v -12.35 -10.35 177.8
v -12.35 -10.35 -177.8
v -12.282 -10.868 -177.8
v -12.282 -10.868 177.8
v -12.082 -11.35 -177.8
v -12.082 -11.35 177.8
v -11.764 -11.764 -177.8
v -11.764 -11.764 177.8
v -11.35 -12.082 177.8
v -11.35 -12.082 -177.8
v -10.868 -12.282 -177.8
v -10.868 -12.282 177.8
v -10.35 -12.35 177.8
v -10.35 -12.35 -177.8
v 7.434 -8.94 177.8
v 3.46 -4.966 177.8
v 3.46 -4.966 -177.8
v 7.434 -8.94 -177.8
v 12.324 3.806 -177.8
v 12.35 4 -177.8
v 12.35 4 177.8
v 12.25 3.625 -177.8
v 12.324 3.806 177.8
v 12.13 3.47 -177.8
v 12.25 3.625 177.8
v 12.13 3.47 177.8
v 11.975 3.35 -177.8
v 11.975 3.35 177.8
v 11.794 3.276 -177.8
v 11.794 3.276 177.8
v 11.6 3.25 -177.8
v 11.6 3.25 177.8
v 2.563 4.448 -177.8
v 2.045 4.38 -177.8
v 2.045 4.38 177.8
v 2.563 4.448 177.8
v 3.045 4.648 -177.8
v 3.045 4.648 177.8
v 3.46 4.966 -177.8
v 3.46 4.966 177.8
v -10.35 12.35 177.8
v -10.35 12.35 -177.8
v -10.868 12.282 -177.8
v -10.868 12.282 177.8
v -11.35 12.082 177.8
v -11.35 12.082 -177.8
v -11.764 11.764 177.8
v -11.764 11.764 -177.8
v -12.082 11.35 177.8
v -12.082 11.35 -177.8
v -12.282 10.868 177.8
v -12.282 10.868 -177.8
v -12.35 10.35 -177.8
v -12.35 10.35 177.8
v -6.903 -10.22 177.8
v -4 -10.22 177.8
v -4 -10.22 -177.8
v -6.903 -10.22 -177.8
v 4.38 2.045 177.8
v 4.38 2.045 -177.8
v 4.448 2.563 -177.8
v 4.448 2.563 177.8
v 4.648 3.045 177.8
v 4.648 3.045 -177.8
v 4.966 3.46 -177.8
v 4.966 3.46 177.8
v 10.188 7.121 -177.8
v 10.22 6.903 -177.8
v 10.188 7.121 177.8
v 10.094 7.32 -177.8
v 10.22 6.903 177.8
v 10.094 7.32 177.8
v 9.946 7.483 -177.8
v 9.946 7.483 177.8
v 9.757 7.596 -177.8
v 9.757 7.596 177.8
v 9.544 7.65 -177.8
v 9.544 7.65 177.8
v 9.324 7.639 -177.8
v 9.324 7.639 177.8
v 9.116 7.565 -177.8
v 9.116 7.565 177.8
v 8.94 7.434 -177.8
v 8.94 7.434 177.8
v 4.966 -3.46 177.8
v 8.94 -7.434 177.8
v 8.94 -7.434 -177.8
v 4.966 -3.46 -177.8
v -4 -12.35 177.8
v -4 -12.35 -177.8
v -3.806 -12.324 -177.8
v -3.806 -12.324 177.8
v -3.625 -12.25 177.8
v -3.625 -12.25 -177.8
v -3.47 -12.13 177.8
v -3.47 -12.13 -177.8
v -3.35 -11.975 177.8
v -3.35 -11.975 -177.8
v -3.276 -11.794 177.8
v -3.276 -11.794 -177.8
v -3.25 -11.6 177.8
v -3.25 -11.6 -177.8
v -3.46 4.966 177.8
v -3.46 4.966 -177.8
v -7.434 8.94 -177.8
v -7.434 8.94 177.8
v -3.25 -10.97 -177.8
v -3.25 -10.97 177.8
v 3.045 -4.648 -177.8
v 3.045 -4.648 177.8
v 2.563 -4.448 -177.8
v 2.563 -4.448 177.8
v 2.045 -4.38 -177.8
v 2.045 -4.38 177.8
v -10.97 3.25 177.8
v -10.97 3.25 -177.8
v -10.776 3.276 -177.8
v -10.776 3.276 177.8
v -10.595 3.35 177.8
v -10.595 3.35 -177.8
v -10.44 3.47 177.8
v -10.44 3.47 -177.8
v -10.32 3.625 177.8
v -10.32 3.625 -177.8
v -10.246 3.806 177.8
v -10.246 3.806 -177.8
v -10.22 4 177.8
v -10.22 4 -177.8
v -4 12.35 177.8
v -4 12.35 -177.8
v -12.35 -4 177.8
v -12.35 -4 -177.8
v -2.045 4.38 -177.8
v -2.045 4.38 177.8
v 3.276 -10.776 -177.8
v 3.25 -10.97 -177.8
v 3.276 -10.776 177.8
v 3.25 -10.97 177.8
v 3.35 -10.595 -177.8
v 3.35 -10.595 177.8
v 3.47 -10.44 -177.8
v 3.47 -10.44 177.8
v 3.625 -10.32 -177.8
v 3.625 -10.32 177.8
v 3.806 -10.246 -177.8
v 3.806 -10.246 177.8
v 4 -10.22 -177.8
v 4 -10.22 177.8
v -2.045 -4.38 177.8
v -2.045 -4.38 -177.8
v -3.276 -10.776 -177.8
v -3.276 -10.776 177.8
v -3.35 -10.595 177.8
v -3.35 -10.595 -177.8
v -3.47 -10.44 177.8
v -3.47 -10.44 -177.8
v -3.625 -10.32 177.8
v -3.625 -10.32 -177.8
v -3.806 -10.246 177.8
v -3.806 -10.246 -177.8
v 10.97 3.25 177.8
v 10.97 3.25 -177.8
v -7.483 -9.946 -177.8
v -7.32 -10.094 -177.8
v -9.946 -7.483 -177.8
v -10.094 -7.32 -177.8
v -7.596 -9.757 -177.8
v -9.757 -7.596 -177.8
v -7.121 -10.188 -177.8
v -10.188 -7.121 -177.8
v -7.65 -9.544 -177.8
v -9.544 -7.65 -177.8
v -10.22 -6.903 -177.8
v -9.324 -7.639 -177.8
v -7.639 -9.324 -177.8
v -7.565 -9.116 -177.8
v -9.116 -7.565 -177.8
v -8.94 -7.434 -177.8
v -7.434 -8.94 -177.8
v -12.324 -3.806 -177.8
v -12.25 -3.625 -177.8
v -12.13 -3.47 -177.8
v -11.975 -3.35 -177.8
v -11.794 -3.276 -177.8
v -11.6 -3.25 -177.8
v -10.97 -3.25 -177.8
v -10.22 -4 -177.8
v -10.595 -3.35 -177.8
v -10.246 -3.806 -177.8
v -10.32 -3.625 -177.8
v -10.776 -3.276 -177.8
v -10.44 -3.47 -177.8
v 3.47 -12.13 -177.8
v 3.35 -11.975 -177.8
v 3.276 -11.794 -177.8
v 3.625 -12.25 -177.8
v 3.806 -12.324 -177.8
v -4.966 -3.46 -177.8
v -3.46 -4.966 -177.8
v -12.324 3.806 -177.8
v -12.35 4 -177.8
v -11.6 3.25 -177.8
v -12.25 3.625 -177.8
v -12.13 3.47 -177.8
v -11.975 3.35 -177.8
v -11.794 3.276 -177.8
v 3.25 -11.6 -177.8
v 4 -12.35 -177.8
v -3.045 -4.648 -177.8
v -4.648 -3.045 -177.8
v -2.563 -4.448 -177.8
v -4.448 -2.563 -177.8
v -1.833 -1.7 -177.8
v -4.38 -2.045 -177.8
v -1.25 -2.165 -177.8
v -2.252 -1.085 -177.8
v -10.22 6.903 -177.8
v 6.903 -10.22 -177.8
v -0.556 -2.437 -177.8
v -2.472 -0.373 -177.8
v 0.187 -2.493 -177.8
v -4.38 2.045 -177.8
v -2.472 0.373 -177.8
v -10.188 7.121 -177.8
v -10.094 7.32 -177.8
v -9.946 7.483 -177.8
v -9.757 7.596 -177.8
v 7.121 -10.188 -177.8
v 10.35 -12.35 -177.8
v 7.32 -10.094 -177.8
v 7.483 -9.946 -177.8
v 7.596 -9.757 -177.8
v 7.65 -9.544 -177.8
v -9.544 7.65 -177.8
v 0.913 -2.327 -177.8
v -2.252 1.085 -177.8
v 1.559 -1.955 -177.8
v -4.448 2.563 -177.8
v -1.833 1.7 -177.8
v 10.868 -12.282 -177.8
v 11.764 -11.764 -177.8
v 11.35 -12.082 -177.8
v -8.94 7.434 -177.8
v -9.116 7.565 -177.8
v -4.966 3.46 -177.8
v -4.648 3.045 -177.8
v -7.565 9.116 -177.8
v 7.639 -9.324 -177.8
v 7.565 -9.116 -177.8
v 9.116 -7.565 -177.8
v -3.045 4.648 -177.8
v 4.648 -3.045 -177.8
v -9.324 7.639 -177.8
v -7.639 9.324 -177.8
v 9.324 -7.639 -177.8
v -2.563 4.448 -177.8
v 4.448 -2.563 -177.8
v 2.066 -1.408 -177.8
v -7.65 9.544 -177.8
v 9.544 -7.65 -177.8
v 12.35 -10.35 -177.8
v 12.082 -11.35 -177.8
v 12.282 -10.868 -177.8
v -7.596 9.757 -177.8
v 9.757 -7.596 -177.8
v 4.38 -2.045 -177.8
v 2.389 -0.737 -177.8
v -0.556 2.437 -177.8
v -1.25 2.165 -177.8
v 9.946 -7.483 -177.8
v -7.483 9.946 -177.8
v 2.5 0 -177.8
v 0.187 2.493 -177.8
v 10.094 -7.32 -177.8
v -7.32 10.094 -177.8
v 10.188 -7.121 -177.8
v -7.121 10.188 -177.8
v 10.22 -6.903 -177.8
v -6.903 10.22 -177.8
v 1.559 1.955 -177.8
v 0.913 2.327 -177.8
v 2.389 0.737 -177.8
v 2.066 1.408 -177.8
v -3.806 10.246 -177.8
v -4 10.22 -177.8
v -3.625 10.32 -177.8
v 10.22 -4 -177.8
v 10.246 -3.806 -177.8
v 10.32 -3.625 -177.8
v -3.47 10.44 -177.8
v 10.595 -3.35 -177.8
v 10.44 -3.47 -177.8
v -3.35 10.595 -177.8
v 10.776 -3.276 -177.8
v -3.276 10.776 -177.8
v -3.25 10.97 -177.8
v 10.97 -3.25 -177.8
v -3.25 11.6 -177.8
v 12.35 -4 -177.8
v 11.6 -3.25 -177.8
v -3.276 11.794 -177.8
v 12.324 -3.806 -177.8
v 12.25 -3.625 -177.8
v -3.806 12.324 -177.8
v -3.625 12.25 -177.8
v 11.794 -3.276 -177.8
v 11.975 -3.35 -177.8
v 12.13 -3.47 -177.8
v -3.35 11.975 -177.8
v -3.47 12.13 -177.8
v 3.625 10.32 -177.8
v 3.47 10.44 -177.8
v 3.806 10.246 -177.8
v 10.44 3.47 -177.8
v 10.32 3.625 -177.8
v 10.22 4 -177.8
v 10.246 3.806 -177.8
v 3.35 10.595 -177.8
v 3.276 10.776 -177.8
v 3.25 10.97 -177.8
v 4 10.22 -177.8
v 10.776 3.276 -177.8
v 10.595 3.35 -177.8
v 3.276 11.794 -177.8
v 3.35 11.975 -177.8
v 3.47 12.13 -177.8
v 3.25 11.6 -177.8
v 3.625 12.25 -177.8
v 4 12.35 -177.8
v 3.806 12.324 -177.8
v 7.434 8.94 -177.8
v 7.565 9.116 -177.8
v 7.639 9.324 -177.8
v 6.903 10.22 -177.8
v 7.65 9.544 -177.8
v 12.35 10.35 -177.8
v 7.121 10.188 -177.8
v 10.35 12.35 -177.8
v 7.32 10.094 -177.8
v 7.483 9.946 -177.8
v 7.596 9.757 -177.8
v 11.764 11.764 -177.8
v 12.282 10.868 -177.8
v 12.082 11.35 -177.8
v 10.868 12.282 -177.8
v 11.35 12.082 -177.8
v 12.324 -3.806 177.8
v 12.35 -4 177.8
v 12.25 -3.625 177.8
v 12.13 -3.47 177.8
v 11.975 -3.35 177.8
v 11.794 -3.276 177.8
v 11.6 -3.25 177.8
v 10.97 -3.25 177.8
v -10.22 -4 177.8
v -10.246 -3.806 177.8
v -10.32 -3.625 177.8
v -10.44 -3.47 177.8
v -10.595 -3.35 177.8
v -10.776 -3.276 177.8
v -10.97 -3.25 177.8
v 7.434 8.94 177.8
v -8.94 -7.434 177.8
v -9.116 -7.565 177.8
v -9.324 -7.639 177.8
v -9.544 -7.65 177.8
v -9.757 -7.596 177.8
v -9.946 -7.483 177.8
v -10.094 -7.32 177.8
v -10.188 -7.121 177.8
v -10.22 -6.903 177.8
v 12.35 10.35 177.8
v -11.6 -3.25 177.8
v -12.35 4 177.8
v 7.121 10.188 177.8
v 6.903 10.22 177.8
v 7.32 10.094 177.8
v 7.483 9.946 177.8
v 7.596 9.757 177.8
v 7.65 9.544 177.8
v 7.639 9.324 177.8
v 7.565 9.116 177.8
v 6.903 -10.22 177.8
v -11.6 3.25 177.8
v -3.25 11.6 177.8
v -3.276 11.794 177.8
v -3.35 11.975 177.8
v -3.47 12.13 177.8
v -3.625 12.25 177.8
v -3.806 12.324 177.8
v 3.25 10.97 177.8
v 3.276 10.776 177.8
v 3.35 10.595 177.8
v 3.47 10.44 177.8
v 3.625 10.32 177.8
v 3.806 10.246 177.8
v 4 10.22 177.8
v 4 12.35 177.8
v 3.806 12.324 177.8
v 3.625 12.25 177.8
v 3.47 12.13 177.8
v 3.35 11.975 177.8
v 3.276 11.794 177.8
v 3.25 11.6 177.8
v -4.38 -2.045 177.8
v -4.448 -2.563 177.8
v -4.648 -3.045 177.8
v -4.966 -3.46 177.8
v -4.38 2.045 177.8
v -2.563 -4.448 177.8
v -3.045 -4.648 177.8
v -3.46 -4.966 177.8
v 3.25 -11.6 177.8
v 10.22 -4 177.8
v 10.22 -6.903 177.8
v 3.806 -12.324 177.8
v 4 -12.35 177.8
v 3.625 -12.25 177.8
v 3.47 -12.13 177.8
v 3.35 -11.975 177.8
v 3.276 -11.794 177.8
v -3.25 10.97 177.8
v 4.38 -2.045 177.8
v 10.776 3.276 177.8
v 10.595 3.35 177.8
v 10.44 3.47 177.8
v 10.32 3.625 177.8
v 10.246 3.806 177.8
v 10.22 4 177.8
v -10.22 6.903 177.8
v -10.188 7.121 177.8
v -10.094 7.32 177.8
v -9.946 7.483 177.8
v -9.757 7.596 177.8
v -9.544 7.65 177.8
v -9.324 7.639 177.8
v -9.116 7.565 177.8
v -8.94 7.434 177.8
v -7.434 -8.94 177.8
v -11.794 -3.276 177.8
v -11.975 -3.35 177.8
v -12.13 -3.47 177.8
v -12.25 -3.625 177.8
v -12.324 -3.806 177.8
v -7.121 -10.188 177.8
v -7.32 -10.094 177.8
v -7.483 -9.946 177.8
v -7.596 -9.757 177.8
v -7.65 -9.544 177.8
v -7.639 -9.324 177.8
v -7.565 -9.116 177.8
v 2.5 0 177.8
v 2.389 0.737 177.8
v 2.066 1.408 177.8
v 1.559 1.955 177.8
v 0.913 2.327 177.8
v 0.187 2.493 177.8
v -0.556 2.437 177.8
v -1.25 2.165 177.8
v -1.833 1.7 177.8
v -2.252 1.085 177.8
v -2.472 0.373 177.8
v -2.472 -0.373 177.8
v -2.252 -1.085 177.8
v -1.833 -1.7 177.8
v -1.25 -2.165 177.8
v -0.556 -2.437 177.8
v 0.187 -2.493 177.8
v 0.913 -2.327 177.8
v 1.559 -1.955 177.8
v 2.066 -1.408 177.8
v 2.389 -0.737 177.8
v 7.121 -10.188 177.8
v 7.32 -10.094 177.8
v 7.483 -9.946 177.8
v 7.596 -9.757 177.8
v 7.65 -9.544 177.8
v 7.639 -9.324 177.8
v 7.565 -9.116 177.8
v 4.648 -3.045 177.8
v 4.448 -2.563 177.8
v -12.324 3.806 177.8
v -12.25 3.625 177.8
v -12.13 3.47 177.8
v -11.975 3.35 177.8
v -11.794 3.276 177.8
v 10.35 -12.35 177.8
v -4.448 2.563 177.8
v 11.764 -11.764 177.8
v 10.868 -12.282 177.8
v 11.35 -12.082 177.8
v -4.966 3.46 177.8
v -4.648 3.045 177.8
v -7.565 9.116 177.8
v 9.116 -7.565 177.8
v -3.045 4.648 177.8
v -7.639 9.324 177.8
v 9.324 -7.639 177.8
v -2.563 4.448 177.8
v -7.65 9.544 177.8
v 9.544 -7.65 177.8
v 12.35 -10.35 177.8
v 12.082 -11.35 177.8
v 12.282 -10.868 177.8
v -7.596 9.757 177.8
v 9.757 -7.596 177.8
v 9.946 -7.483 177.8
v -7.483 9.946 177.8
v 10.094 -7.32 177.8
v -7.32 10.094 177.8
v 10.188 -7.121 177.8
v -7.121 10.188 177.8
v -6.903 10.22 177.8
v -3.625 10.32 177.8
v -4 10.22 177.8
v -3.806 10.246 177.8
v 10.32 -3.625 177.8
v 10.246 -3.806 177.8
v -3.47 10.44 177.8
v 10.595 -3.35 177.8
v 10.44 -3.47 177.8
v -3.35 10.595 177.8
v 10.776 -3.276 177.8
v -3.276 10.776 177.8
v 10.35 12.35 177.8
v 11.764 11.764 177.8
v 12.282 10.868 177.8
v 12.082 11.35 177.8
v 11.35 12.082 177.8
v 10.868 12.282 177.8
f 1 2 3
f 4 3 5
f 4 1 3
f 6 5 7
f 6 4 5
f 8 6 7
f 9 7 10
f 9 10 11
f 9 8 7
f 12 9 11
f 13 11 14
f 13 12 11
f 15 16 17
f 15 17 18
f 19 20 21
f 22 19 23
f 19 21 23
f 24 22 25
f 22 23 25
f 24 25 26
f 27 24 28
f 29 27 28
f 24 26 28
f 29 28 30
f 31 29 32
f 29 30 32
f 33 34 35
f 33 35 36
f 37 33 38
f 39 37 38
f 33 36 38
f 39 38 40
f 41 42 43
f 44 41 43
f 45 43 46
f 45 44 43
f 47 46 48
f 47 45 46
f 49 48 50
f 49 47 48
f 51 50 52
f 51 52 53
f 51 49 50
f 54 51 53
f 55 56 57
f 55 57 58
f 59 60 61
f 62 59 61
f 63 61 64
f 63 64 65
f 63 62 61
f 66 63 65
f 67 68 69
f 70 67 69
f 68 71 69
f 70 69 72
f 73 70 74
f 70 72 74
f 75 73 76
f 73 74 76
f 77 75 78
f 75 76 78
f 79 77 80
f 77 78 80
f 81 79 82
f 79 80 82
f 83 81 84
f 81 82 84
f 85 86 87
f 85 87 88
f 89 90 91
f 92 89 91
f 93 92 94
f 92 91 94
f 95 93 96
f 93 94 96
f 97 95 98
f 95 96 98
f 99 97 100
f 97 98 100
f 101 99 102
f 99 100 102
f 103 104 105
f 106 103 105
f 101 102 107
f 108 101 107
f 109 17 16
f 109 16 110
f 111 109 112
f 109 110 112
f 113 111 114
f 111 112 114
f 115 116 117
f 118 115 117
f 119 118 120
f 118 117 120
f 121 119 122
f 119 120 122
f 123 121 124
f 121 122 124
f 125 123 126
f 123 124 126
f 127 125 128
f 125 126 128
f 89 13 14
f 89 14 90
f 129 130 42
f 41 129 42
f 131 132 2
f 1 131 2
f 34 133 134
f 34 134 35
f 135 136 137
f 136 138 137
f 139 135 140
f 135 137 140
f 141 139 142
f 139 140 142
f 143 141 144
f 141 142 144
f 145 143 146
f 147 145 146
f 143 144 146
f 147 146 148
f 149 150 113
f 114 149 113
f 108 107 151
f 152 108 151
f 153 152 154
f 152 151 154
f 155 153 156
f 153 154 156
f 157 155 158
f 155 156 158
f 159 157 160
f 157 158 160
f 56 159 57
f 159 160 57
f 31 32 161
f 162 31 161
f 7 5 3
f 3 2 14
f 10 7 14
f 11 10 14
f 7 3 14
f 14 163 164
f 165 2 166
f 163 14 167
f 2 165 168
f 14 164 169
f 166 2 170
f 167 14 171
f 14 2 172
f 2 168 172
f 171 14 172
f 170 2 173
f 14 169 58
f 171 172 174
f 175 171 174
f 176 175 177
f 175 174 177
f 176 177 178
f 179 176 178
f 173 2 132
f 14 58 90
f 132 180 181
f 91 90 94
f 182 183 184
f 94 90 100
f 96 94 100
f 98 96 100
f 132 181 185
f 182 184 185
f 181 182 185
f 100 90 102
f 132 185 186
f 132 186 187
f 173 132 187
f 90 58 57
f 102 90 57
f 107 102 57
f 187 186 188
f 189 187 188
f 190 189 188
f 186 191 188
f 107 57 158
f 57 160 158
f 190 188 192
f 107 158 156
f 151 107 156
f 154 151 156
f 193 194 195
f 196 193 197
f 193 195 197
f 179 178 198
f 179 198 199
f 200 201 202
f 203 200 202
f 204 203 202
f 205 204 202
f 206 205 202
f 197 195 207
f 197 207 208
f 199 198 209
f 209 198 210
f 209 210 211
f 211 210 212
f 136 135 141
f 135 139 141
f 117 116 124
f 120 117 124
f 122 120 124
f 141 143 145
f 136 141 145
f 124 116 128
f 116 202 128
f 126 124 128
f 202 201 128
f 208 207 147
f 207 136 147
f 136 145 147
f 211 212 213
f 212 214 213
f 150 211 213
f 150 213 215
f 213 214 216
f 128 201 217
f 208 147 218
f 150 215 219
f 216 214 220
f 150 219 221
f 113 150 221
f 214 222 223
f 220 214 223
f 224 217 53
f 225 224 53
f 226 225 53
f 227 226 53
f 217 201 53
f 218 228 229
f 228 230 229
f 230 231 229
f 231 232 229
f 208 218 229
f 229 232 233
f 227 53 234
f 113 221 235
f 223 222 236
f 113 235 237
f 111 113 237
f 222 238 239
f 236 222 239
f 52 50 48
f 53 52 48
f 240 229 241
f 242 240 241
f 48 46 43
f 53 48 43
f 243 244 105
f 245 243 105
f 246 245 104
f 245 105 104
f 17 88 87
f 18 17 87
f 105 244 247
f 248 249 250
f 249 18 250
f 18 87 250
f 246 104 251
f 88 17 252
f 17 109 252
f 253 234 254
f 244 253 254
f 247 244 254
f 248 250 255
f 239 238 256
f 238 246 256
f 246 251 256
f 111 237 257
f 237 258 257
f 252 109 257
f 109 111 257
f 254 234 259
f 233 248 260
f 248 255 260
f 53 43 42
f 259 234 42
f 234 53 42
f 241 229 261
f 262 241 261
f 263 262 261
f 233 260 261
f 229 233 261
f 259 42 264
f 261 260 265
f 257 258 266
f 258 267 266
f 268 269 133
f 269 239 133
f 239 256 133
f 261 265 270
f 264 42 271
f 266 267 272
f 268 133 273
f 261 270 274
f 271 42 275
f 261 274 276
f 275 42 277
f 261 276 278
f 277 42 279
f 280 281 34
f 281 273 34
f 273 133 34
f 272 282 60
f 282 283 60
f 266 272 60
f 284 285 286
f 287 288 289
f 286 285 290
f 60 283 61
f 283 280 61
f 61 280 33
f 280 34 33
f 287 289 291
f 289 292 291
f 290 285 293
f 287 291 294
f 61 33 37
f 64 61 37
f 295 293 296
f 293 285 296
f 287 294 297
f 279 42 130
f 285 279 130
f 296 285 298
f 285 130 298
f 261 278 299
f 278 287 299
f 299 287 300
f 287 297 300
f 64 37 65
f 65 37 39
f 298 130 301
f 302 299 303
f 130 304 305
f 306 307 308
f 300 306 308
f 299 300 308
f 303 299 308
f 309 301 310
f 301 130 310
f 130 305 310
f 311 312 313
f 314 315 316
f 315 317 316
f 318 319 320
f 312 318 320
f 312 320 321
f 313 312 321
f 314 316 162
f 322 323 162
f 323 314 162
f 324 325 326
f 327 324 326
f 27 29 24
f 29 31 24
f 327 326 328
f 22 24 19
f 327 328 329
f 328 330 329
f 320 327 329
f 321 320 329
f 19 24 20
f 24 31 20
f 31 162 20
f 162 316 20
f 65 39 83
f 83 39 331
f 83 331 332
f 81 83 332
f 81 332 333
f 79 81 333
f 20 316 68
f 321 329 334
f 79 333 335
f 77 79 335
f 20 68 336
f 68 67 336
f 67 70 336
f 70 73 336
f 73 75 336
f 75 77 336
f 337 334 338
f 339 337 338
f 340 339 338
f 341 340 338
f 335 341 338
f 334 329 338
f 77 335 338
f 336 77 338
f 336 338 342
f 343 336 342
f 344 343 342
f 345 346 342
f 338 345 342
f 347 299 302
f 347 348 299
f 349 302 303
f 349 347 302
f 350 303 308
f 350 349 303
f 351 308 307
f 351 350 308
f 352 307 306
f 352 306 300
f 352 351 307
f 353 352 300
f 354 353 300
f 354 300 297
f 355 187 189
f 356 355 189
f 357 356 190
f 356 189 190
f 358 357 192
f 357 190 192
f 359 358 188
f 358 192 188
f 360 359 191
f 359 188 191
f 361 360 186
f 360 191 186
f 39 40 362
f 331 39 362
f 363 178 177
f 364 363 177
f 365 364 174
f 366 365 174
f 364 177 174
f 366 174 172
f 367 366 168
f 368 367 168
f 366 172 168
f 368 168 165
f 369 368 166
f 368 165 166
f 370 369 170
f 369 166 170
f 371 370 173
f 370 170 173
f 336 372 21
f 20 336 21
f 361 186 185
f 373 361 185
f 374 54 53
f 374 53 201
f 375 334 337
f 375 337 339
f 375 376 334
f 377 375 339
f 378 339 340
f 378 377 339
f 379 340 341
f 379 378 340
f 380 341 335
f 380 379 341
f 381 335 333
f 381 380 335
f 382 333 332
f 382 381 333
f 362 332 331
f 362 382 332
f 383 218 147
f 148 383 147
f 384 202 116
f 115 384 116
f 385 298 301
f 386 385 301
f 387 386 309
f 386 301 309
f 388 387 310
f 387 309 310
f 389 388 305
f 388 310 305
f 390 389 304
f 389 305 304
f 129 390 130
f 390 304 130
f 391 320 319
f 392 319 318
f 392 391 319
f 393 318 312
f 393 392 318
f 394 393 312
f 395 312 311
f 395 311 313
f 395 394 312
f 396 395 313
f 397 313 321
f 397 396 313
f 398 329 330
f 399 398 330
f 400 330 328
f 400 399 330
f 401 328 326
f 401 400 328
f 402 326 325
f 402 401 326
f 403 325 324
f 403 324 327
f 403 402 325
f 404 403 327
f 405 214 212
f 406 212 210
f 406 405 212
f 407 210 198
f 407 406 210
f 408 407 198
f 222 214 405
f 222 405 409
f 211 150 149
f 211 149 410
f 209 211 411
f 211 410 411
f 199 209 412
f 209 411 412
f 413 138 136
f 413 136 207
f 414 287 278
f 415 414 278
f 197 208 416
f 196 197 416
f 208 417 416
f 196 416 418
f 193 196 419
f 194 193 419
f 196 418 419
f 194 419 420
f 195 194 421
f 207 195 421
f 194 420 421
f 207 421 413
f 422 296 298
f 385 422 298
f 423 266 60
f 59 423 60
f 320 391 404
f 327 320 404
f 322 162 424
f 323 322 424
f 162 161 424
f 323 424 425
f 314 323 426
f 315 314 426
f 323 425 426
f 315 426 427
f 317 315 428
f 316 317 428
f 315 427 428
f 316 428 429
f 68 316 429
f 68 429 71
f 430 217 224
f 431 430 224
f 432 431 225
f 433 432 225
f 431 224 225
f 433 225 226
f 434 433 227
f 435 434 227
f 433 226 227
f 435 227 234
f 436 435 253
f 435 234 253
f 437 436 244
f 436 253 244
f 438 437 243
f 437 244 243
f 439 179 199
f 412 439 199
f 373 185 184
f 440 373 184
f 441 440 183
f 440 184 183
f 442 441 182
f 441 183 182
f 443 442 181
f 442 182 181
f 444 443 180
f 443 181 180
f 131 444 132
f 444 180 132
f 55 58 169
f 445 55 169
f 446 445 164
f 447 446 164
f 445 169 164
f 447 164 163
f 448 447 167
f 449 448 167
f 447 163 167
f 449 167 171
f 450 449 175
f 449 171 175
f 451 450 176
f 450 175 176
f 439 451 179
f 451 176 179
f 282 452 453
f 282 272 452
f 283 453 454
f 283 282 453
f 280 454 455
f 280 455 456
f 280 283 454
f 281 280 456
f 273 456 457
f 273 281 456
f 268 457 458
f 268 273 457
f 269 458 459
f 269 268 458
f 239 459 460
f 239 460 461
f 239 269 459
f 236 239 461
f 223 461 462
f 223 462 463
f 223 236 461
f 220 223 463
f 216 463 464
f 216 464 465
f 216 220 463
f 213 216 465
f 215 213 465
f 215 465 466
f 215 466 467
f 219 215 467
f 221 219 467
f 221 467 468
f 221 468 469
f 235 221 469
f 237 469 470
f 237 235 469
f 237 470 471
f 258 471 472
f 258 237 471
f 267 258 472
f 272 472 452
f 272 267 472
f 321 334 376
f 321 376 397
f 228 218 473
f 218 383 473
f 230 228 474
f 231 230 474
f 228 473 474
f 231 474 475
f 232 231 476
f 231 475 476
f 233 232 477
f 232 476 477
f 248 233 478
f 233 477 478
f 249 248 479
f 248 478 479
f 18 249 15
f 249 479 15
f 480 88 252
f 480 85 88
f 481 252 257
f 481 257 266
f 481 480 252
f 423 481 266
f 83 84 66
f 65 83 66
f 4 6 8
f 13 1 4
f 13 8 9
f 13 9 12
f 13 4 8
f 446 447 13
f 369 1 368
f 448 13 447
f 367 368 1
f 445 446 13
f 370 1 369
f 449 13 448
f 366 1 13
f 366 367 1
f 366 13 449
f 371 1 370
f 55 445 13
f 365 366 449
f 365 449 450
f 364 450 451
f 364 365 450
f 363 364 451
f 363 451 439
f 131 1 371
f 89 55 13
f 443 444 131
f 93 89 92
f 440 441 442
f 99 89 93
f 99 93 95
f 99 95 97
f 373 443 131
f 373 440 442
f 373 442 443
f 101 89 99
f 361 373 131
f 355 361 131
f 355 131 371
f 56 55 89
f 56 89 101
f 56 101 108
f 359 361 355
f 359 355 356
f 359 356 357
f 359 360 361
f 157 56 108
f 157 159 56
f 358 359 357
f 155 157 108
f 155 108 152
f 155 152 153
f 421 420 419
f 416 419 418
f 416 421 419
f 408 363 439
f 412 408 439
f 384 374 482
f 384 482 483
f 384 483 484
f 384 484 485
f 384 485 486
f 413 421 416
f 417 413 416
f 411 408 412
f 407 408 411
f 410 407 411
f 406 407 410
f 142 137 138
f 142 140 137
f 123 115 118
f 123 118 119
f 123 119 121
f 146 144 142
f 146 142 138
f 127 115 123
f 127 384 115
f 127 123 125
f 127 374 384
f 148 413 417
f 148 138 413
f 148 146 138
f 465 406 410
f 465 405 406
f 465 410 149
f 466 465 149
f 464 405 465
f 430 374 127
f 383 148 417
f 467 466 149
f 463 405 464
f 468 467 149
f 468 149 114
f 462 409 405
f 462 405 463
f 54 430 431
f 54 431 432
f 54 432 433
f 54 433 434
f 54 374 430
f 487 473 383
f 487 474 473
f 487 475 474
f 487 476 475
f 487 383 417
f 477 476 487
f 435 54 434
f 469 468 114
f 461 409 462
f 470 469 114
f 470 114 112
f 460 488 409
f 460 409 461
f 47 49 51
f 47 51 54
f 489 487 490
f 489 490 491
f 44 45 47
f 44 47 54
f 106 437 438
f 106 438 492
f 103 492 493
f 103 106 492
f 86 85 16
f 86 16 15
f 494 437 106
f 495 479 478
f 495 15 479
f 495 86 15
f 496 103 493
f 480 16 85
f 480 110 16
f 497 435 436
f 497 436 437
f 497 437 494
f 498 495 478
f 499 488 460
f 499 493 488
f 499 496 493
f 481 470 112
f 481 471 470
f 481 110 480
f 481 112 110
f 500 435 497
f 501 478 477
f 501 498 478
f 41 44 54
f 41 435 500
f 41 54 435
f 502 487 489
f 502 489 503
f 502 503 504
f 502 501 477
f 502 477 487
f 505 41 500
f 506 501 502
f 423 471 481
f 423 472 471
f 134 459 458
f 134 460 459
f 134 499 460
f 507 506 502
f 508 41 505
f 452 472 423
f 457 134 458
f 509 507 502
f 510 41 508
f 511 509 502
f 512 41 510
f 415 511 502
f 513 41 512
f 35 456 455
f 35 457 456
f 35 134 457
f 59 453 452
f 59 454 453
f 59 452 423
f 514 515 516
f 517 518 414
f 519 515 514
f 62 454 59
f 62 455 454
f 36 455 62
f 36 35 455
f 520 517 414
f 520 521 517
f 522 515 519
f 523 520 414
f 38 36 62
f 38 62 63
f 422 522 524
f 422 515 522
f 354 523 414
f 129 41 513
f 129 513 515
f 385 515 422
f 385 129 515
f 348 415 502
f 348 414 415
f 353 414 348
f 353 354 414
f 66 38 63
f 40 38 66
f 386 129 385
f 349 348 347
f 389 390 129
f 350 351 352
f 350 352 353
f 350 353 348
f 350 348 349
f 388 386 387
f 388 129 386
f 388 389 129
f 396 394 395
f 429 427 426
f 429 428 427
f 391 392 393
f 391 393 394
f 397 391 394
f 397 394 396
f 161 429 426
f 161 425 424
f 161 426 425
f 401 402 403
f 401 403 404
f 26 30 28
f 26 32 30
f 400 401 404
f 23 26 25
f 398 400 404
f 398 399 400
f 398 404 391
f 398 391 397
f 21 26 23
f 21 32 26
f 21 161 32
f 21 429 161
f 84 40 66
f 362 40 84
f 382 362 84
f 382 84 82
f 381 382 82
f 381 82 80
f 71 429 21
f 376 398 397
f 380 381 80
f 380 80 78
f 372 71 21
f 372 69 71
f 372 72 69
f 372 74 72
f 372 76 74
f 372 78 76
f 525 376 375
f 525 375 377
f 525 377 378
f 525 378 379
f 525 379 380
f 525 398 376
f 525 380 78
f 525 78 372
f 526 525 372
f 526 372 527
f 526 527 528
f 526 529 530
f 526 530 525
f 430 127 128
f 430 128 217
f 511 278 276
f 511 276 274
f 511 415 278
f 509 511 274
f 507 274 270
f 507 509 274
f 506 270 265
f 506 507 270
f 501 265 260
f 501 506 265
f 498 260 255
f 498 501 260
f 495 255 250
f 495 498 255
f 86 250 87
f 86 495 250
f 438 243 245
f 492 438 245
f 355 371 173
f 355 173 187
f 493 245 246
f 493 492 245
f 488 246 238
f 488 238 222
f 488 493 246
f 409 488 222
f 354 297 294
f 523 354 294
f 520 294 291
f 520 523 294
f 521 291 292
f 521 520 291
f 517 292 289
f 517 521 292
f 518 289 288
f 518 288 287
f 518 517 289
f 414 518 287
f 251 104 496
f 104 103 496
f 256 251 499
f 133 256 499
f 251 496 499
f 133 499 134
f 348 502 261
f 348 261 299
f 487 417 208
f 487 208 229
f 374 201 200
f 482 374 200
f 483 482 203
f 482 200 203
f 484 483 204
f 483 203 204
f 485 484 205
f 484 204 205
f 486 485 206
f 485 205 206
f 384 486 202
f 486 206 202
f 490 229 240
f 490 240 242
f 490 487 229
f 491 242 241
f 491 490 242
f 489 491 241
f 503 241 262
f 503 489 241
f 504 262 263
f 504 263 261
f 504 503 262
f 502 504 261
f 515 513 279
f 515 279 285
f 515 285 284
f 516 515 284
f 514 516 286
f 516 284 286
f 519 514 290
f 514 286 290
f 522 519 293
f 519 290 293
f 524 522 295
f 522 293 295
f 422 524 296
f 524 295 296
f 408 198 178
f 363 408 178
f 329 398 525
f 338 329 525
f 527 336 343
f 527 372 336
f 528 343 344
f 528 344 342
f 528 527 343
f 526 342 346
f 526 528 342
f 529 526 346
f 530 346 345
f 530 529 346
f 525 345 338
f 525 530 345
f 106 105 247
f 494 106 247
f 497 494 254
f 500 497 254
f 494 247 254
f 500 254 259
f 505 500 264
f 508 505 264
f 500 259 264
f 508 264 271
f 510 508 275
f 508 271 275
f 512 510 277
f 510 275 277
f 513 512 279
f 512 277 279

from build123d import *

# Parameters (mm, degrees)
SKETCH2_W            = 8.76
SKETCH2_H            = 8.76
SKETCH2_R            = 2.5
BOSS_EXTRUDE1_DEPTH  = 177.8
BOSS_EXTRUDE2_START  = -177.8
BOSS_EXTRUDE2_DEPTH  = 355.6
FILLET1_R            = 0.75
FILLET1_OF_MIRROR1_R = 0.75
MIRROR2_START        = -177.8
MIRROR2_DEPTH        = 355.6
FILLET2_R            = 2


# Read off the part's stored shape, not the designer's step: Mirror2
with BuildPart() as part:
    # Sketch2 → Boss-Extrude1 (new, symmetric)
    with BuildSketch(Plane.XY):
        Rectangle(SKETCH2_W, SKETCH2_H)
        Circle(SKETCH2_R, mode=Mode.SUBTRACT)
    extrude(amount=BOSS_EXTRUDE1_DEPTH, both=True)

    # Sketch3 → Boss-Extrude2 (add)
    with BuildSketch(Plane.XY.offset(BOSS_EXTRUDE2_START)):
        Polygon((3.25, 12.35), (12.35, 12.35), (12.35, 3.25), (10.22, 3.25), (10.22, 8.713862556), (4.38, 2.873862556), (4.38, 4.38), (2.873862556, 4.38), (8.713862556, 10.22), (3.25, 10.22), align=None)
    boss_extrude2 = extrude(amount=BOSS_EXTRUDE2_DEPTH)

    # Fillet1
    fillet1_edges = [part.edges().sort_by_distance(p)[0] for p in [
        (3.25, 12.35, 0),
        (3.25, 10.22, 0),
        (8.713862556, 10.22, 0),
        (10.22, 8.713862556, 0),
        (10.22, 3.25, 0),
        (12.35, 3.25, 0),
    ]]
    fillet(fillet1_edges, radius=FILLET1_R)

    # Mirror1: Boss-Extrude2 across plane
    add(boss_extrude2.mirror(Plane.ZX))

    # Fillet1 of Mirror1
    fillet1_of_mirror1_edges = [part.edges().sort_by_distance(p)[0] for p in [
        (3.25, -12.35, 0),
        (3.25, -10.22, 0),
        (8.713862556, -10.22, 0),
        (10.22, -8.713862556, 0),
        (10.22, -3.25, 0),
        (12.35, -3.25, 0),
    ]]
    fillet(fillet1_of_mirror1_edges, radius=FILLET1_OF_MIRROR1_R)

    # Mirror2 outline → Mirror2 (add)
    with BuildSketch(Plane.XY.offset(MIRROR2_START)):
        with BuildLine():
            ThreePointArc((-7.43353247, 8.939669914), (-7.596112034, 9.757012574), (-6.903202384, 10.22))
            Line((-6.903202384, 10.22), (-4, 10.22))
            ThreePointArc((-4, 10.22), (-3.469669914, 10.439669914), (-3.25, 10.97))
            Line((-3.25, 10.97), (-3.25, 11.6))
            ThreePointArc((-3.25, 11.6), (-3.469669914, 12.130330086), (-4, 12.35))
            Line((-4, 12.35), (-12.35, 12.35))
            Line((-12.35, 12.35), (-12.35, 4))
            ThreePointArc((-12.35, 4), (-12.130330086, 3.469669914), (-11.6, 3.25))
            Line((-11.6, 3.25), (-10.97, 3.25))
            ThreePointArc((-10.97, 3.25), (-10.439669914, 3.469669914), (-10.22, 4))
            Line((-10.22, 4), (-10.22, 6.903202384))
            ThreePointArc((-10.22, 6.903202384), (-9.757012574, 7.596112034), (-8.939669914, 7.43353247))
            Line((-8.939669914, 7.43353247), (-4.38, 2.873862556))
            Line((-4.38, 2.873862556), (-4.38, 4.38))
            Line((-4.38, 4.38), (-2.873862556, 4.38))
            Line((-2.873862556, 4.38), (-7.43353247, 8.939669914))
        make_face()
        with BuildLine():
            Line((-4.38, -4.38), (-4.38, -2.873862556))
            Line((-4.38, -2.873862556), (-8.939669914, -7.43353247))
            ThreePointArc((-8.939669914, -7.43353247), (-9.757012574, -7.596112034), (-10.22, -6.903202384))
            Line((-10.22, -6.903202384), (-10.22, -4))
            ThreePointArc((-10.22, -4), (-10.439669914, -3.469669914), (-10.97, -3.25))
            Line((-10.97, -3.25), (-11.6, -3.25))
            ThreePointArc((-11.6, -3.25), (-12.130330086, -3.469669914), (-12.35, -4))
            Line((-12.35, -4), (-12.35, -12.35))
            Line((-12.35, -12.35), (-4, -12.35))
            ThreePointArc((-4, -12.35), (-3.469669914, -12.130330086), (-3.25, -11.6))
            Line((-3.25, -11.6), (-3.25, -10.97))
            ThreePointArc((-3.25, -10.97), (-3.469669914, -10.439669914), (-4, -10.22))
            Line((-4, -10.22), (-6.903202384, -10.22))
            ThreePointArc((-6.903202384, -10.22), (-7.596112034, -9.757012574), (-7.43353247, -8.939669914))
            Line((-7.43353247, -8.939669914), (-2.873862556, -4.38))
            Line((-2.873862556, -4.38), (-4.38, -4.38))
        make_face()
    extrude(amount=MIRROR2_DEPTH)

    # Fillet2
    fillet2_edges = [part.edges().sort_by_distance(p)[0] for p in [
        (-2.873862556, -4.38, 0),
        (-4.38, -2.873862556, 0),
        (-12.35, -12.35, 0),
        (2.873862556, 4.38, 0),
        (4.38, 2.873862556, 0),
        (12.35, 12.35, 0),
        (-2.873862556, 4.38, 0),
        (-4.38, 2.873862556, 0),
        (-12.35, 12.35, 0),
        (2.873862556, -4.38, 0),
        (4.38, -2.873862556, 0),
        (12.35, -12.35, 0),
    ]]
    fillet(fillet2_edges, radius=FILLET2_R)


solid = part.part
